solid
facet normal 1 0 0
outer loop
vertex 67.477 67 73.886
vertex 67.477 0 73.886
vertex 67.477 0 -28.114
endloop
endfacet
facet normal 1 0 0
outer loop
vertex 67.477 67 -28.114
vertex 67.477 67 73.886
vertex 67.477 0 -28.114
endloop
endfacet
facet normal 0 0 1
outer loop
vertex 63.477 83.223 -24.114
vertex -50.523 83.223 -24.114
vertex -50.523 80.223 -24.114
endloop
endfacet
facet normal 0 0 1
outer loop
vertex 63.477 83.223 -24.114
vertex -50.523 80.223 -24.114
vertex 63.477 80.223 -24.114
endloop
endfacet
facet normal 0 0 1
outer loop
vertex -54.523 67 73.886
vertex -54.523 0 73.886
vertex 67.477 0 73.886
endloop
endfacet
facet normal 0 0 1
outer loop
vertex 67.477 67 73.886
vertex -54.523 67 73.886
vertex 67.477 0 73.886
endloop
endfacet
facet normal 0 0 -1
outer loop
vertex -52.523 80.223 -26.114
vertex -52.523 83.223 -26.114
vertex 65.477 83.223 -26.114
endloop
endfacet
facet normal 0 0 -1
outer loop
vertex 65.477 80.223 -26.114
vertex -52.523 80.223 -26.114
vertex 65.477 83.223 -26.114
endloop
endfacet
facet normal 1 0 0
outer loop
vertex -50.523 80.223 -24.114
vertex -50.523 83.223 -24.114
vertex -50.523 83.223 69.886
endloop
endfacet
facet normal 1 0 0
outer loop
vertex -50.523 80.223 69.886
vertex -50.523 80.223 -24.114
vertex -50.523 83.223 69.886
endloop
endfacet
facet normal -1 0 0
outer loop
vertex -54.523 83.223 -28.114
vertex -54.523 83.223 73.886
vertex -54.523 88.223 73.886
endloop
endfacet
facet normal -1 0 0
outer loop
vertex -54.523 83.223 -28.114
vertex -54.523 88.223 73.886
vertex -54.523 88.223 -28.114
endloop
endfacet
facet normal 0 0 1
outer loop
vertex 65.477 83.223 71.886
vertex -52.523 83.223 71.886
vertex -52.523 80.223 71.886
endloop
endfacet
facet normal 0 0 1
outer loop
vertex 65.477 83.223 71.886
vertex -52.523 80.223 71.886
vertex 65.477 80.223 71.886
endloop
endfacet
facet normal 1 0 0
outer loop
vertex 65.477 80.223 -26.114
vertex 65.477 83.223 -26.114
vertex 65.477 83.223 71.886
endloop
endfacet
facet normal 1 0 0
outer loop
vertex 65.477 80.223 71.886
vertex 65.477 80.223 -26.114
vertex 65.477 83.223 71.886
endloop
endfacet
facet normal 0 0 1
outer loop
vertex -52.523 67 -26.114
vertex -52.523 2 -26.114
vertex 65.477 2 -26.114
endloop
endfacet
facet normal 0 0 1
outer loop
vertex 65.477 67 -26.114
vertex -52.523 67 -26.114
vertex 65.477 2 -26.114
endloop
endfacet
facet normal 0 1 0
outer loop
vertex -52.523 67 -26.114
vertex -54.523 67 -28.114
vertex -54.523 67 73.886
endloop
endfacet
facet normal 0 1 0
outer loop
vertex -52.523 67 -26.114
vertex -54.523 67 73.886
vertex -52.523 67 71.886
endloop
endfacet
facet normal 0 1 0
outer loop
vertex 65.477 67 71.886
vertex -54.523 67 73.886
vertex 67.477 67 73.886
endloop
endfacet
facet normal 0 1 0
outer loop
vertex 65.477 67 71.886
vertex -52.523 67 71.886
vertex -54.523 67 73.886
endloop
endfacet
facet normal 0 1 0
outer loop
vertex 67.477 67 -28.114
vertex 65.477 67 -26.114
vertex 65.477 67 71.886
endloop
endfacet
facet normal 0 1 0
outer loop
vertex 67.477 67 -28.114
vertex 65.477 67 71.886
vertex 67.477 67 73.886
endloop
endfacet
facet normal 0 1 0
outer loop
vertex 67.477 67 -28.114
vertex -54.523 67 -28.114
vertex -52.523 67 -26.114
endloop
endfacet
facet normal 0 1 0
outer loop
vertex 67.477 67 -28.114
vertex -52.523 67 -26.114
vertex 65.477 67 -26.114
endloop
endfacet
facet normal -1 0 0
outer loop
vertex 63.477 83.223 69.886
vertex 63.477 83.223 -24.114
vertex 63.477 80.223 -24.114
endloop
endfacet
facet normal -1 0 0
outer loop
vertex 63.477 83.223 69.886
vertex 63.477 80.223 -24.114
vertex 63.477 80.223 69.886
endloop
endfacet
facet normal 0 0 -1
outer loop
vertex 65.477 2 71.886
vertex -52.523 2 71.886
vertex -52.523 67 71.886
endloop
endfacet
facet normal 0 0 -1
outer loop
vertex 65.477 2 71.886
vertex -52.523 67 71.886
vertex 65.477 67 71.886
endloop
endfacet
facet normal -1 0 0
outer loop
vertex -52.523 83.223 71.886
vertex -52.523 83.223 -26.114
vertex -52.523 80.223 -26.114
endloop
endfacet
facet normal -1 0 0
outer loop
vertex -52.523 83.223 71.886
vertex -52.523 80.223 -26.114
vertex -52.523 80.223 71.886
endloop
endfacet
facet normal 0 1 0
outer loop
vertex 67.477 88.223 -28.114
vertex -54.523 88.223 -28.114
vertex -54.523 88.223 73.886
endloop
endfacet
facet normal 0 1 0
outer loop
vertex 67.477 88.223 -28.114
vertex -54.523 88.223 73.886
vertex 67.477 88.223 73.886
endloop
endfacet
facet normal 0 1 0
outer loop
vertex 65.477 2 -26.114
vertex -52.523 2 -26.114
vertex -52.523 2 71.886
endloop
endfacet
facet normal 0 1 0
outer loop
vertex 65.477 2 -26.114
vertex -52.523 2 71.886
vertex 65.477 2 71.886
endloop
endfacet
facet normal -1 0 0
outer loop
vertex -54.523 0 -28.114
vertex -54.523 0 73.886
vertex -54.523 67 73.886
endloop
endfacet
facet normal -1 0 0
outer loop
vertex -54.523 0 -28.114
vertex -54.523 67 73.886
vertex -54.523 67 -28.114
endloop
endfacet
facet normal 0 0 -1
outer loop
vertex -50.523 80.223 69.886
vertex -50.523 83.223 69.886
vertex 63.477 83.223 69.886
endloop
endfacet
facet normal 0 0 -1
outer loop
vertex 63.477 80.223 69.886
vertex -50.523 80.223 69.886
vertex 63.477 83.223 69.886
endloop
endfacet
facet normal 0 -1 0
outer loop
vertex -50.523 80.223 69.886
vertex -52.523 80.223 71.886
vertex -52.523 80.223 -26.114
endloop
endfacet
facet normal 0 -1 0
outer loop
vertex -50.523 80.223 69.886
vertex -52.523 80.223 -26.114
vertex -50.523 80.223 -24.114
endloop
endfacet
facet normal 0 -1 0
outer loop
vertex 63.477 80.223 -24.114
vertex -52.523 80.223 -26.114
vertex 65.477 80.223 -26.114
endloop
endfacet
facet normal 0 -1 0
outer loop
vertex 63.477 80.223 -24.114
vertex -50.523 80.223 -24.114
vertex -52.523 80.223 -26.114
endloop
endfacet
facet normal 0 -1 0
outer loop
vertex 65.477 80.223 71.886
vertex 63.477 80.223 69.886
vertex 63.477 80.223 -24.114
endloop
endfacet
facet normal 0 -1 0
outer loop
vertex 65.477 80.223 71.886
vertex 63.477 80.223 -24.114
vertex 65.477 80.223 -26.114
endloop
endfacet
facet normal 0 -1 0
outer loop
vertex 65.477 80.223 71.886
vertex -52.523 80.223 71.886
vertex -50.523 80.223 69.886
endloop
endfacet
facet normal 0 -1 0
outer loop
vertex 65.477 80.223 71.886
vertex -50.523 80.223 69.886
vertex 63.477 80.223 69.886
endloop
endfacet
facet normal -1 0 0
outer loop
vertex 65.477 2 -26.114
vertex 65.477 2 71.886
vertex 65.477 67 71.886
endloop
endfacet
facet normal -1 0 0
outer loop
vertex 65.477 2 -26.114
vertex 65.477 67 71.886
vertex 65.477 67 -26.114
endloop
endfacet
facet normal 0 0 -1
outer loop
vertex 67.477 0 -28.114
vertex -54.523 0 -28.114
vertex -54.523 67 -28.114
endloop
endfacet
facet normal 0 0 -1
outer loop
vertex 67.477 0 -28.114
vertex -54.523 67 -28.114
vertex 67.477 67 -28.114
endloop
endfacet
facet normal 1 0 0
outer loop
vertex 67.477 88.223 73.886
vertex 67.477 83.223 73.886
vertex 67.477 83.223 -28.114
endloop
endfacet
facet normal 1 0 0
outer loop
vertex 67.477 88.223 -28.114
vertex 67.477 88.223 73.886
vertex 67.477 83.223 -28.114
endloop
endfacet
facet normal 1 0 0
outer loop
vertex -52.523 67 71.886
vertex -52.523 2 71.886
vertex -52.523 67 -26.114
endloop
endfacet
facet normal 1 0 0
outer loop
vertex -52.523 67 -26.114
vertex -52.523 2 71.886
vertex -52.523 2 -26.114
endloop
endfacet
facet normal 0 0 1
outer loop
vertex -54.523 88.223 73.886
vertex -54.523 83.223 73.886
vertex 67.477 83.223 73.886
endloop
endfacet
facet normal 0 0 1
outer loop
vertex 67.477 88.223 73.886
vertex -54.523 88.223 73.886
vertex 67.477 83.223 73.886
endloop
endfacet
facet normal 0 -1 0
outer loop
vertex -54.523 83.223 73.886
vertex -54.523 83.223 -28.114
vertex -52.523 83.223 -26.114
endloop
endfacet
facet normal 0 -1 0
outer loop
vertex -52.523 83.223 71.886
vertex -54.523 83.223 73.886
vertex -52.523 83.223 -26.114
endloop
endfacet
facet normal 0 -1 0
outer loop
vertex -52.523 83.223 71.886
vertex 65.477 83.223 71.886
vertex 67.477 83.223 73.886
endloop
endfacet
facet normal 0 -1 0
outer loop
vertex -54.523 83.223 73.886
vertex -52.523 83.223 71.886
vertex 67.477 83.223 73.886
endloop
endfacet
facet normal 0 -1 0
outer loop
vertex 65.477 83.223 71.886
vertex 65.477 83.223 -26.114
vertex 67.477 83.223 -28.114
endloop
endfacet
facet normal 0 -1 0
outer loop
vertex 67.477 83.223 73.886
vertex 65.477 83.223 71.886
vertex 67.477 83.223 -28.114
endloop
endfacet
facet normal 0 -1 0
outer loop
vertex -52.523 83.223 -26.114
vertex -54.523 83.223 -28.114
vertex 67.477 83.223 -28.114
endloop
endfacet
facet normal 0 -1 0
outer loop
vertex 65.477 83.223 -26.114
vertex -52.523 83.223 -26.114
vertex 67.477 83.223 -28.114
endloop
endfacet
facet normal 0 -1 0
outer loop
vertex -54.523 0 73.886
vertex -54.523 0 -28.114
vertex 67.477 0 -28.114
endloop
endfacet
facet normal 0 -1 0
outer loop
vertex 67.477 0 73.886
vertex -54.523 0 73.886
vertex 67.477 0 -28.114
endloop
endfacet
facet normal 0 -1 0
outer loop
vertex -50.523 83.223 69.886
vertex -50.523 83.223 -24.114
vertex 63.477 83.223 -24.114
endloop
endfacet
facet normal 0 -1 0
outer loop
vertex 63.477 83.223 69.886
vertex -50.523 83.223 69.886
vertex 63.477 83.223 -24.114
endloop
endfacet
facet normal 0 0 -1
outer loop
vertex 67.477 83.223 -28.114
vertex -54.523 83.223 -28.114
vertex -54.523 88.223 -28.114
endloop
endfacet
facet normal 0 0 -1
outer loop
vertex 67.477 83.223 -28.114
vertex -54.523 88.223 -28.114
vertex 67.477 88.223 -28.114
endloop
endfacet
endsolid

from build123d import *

# Parameters (mm, degrees)
SKETCH2_W           = 122
SKETCH2_H           = 102
BOSS_EXTRUDE1_DEPTH = 67
SHELL2_T            = -2
SKETCH7_W           = 122
SKETCH7_H           = 102
BOSS_EXTRUDE3_DEPTH = 5
SKETCH8_W           = 118
SKETCH8_H           = 98
SKETCH8_W_2         = 114
SKETCH8_H_2         = 94
EXTRUDE_THIN1_DEPTH = 3


with BuildPart() as part:
    # Sketch2 → Boss-Extrude1 (new body)
    with BuildSketch(Plane(origin=(0, 0, 0), x_dir=(1, 0, 0), z_dir=(0, 1, 0))):
        with Locations((6.476673428, -22.886409736)):
            Rectangle(SKETCH2_W, SKETCH2_H)
    extrude(amount=BOSS_EXTRUDE1_DEPTH)

    # Shell2
    shell2_openings = [part.faces().sort_by_distance(p)[0] for p in [
        (6.476673428, 67, 22.886409736),
    ]]
    offset(amount=SHELL2_T, openings=shell2_openings, kind=Kind.INTERSECTION)


with BuildPart() as body_2:
    # Sketch7 → Boss-Extrude3 (new body)
    with BuildSketch(Plane(origin=(0, 67, 0), x_dir=(1, 0, 0), z_dir=(0, 1, 0))):
        with Locations((6.476673428, -22.886409736)):
            Rectangle(SKETCH7_W, SKETCH7_H)
    extrude(amount=BOSS_EXTRUDE3_DEPTH)

    # Sketch8 → Extrude-Thin1 (add)
    with BuildSketch(Plane.XZ.offset(-67)):
        with Locations((6.476673428, 22.886409736)):
            Rectangle(SKETCH8_W, SKETCH8_H)
        with Locations((6.476673428, 22.886409736)):
            Rectangle(SKETCH8_W_2, SKETCH8_H_2, mode=Mode.SUBTRACT)
    extrude(amount=EXTRUDE_THIN1_DEPTH)


with BuildPart() as body_2_1:
    # Body-Move/Copy1: moved
    add(body_2.part.moved(Location((0, 16.223281248, 0))))


solid = Compound([part.part, body_2_1.part])
